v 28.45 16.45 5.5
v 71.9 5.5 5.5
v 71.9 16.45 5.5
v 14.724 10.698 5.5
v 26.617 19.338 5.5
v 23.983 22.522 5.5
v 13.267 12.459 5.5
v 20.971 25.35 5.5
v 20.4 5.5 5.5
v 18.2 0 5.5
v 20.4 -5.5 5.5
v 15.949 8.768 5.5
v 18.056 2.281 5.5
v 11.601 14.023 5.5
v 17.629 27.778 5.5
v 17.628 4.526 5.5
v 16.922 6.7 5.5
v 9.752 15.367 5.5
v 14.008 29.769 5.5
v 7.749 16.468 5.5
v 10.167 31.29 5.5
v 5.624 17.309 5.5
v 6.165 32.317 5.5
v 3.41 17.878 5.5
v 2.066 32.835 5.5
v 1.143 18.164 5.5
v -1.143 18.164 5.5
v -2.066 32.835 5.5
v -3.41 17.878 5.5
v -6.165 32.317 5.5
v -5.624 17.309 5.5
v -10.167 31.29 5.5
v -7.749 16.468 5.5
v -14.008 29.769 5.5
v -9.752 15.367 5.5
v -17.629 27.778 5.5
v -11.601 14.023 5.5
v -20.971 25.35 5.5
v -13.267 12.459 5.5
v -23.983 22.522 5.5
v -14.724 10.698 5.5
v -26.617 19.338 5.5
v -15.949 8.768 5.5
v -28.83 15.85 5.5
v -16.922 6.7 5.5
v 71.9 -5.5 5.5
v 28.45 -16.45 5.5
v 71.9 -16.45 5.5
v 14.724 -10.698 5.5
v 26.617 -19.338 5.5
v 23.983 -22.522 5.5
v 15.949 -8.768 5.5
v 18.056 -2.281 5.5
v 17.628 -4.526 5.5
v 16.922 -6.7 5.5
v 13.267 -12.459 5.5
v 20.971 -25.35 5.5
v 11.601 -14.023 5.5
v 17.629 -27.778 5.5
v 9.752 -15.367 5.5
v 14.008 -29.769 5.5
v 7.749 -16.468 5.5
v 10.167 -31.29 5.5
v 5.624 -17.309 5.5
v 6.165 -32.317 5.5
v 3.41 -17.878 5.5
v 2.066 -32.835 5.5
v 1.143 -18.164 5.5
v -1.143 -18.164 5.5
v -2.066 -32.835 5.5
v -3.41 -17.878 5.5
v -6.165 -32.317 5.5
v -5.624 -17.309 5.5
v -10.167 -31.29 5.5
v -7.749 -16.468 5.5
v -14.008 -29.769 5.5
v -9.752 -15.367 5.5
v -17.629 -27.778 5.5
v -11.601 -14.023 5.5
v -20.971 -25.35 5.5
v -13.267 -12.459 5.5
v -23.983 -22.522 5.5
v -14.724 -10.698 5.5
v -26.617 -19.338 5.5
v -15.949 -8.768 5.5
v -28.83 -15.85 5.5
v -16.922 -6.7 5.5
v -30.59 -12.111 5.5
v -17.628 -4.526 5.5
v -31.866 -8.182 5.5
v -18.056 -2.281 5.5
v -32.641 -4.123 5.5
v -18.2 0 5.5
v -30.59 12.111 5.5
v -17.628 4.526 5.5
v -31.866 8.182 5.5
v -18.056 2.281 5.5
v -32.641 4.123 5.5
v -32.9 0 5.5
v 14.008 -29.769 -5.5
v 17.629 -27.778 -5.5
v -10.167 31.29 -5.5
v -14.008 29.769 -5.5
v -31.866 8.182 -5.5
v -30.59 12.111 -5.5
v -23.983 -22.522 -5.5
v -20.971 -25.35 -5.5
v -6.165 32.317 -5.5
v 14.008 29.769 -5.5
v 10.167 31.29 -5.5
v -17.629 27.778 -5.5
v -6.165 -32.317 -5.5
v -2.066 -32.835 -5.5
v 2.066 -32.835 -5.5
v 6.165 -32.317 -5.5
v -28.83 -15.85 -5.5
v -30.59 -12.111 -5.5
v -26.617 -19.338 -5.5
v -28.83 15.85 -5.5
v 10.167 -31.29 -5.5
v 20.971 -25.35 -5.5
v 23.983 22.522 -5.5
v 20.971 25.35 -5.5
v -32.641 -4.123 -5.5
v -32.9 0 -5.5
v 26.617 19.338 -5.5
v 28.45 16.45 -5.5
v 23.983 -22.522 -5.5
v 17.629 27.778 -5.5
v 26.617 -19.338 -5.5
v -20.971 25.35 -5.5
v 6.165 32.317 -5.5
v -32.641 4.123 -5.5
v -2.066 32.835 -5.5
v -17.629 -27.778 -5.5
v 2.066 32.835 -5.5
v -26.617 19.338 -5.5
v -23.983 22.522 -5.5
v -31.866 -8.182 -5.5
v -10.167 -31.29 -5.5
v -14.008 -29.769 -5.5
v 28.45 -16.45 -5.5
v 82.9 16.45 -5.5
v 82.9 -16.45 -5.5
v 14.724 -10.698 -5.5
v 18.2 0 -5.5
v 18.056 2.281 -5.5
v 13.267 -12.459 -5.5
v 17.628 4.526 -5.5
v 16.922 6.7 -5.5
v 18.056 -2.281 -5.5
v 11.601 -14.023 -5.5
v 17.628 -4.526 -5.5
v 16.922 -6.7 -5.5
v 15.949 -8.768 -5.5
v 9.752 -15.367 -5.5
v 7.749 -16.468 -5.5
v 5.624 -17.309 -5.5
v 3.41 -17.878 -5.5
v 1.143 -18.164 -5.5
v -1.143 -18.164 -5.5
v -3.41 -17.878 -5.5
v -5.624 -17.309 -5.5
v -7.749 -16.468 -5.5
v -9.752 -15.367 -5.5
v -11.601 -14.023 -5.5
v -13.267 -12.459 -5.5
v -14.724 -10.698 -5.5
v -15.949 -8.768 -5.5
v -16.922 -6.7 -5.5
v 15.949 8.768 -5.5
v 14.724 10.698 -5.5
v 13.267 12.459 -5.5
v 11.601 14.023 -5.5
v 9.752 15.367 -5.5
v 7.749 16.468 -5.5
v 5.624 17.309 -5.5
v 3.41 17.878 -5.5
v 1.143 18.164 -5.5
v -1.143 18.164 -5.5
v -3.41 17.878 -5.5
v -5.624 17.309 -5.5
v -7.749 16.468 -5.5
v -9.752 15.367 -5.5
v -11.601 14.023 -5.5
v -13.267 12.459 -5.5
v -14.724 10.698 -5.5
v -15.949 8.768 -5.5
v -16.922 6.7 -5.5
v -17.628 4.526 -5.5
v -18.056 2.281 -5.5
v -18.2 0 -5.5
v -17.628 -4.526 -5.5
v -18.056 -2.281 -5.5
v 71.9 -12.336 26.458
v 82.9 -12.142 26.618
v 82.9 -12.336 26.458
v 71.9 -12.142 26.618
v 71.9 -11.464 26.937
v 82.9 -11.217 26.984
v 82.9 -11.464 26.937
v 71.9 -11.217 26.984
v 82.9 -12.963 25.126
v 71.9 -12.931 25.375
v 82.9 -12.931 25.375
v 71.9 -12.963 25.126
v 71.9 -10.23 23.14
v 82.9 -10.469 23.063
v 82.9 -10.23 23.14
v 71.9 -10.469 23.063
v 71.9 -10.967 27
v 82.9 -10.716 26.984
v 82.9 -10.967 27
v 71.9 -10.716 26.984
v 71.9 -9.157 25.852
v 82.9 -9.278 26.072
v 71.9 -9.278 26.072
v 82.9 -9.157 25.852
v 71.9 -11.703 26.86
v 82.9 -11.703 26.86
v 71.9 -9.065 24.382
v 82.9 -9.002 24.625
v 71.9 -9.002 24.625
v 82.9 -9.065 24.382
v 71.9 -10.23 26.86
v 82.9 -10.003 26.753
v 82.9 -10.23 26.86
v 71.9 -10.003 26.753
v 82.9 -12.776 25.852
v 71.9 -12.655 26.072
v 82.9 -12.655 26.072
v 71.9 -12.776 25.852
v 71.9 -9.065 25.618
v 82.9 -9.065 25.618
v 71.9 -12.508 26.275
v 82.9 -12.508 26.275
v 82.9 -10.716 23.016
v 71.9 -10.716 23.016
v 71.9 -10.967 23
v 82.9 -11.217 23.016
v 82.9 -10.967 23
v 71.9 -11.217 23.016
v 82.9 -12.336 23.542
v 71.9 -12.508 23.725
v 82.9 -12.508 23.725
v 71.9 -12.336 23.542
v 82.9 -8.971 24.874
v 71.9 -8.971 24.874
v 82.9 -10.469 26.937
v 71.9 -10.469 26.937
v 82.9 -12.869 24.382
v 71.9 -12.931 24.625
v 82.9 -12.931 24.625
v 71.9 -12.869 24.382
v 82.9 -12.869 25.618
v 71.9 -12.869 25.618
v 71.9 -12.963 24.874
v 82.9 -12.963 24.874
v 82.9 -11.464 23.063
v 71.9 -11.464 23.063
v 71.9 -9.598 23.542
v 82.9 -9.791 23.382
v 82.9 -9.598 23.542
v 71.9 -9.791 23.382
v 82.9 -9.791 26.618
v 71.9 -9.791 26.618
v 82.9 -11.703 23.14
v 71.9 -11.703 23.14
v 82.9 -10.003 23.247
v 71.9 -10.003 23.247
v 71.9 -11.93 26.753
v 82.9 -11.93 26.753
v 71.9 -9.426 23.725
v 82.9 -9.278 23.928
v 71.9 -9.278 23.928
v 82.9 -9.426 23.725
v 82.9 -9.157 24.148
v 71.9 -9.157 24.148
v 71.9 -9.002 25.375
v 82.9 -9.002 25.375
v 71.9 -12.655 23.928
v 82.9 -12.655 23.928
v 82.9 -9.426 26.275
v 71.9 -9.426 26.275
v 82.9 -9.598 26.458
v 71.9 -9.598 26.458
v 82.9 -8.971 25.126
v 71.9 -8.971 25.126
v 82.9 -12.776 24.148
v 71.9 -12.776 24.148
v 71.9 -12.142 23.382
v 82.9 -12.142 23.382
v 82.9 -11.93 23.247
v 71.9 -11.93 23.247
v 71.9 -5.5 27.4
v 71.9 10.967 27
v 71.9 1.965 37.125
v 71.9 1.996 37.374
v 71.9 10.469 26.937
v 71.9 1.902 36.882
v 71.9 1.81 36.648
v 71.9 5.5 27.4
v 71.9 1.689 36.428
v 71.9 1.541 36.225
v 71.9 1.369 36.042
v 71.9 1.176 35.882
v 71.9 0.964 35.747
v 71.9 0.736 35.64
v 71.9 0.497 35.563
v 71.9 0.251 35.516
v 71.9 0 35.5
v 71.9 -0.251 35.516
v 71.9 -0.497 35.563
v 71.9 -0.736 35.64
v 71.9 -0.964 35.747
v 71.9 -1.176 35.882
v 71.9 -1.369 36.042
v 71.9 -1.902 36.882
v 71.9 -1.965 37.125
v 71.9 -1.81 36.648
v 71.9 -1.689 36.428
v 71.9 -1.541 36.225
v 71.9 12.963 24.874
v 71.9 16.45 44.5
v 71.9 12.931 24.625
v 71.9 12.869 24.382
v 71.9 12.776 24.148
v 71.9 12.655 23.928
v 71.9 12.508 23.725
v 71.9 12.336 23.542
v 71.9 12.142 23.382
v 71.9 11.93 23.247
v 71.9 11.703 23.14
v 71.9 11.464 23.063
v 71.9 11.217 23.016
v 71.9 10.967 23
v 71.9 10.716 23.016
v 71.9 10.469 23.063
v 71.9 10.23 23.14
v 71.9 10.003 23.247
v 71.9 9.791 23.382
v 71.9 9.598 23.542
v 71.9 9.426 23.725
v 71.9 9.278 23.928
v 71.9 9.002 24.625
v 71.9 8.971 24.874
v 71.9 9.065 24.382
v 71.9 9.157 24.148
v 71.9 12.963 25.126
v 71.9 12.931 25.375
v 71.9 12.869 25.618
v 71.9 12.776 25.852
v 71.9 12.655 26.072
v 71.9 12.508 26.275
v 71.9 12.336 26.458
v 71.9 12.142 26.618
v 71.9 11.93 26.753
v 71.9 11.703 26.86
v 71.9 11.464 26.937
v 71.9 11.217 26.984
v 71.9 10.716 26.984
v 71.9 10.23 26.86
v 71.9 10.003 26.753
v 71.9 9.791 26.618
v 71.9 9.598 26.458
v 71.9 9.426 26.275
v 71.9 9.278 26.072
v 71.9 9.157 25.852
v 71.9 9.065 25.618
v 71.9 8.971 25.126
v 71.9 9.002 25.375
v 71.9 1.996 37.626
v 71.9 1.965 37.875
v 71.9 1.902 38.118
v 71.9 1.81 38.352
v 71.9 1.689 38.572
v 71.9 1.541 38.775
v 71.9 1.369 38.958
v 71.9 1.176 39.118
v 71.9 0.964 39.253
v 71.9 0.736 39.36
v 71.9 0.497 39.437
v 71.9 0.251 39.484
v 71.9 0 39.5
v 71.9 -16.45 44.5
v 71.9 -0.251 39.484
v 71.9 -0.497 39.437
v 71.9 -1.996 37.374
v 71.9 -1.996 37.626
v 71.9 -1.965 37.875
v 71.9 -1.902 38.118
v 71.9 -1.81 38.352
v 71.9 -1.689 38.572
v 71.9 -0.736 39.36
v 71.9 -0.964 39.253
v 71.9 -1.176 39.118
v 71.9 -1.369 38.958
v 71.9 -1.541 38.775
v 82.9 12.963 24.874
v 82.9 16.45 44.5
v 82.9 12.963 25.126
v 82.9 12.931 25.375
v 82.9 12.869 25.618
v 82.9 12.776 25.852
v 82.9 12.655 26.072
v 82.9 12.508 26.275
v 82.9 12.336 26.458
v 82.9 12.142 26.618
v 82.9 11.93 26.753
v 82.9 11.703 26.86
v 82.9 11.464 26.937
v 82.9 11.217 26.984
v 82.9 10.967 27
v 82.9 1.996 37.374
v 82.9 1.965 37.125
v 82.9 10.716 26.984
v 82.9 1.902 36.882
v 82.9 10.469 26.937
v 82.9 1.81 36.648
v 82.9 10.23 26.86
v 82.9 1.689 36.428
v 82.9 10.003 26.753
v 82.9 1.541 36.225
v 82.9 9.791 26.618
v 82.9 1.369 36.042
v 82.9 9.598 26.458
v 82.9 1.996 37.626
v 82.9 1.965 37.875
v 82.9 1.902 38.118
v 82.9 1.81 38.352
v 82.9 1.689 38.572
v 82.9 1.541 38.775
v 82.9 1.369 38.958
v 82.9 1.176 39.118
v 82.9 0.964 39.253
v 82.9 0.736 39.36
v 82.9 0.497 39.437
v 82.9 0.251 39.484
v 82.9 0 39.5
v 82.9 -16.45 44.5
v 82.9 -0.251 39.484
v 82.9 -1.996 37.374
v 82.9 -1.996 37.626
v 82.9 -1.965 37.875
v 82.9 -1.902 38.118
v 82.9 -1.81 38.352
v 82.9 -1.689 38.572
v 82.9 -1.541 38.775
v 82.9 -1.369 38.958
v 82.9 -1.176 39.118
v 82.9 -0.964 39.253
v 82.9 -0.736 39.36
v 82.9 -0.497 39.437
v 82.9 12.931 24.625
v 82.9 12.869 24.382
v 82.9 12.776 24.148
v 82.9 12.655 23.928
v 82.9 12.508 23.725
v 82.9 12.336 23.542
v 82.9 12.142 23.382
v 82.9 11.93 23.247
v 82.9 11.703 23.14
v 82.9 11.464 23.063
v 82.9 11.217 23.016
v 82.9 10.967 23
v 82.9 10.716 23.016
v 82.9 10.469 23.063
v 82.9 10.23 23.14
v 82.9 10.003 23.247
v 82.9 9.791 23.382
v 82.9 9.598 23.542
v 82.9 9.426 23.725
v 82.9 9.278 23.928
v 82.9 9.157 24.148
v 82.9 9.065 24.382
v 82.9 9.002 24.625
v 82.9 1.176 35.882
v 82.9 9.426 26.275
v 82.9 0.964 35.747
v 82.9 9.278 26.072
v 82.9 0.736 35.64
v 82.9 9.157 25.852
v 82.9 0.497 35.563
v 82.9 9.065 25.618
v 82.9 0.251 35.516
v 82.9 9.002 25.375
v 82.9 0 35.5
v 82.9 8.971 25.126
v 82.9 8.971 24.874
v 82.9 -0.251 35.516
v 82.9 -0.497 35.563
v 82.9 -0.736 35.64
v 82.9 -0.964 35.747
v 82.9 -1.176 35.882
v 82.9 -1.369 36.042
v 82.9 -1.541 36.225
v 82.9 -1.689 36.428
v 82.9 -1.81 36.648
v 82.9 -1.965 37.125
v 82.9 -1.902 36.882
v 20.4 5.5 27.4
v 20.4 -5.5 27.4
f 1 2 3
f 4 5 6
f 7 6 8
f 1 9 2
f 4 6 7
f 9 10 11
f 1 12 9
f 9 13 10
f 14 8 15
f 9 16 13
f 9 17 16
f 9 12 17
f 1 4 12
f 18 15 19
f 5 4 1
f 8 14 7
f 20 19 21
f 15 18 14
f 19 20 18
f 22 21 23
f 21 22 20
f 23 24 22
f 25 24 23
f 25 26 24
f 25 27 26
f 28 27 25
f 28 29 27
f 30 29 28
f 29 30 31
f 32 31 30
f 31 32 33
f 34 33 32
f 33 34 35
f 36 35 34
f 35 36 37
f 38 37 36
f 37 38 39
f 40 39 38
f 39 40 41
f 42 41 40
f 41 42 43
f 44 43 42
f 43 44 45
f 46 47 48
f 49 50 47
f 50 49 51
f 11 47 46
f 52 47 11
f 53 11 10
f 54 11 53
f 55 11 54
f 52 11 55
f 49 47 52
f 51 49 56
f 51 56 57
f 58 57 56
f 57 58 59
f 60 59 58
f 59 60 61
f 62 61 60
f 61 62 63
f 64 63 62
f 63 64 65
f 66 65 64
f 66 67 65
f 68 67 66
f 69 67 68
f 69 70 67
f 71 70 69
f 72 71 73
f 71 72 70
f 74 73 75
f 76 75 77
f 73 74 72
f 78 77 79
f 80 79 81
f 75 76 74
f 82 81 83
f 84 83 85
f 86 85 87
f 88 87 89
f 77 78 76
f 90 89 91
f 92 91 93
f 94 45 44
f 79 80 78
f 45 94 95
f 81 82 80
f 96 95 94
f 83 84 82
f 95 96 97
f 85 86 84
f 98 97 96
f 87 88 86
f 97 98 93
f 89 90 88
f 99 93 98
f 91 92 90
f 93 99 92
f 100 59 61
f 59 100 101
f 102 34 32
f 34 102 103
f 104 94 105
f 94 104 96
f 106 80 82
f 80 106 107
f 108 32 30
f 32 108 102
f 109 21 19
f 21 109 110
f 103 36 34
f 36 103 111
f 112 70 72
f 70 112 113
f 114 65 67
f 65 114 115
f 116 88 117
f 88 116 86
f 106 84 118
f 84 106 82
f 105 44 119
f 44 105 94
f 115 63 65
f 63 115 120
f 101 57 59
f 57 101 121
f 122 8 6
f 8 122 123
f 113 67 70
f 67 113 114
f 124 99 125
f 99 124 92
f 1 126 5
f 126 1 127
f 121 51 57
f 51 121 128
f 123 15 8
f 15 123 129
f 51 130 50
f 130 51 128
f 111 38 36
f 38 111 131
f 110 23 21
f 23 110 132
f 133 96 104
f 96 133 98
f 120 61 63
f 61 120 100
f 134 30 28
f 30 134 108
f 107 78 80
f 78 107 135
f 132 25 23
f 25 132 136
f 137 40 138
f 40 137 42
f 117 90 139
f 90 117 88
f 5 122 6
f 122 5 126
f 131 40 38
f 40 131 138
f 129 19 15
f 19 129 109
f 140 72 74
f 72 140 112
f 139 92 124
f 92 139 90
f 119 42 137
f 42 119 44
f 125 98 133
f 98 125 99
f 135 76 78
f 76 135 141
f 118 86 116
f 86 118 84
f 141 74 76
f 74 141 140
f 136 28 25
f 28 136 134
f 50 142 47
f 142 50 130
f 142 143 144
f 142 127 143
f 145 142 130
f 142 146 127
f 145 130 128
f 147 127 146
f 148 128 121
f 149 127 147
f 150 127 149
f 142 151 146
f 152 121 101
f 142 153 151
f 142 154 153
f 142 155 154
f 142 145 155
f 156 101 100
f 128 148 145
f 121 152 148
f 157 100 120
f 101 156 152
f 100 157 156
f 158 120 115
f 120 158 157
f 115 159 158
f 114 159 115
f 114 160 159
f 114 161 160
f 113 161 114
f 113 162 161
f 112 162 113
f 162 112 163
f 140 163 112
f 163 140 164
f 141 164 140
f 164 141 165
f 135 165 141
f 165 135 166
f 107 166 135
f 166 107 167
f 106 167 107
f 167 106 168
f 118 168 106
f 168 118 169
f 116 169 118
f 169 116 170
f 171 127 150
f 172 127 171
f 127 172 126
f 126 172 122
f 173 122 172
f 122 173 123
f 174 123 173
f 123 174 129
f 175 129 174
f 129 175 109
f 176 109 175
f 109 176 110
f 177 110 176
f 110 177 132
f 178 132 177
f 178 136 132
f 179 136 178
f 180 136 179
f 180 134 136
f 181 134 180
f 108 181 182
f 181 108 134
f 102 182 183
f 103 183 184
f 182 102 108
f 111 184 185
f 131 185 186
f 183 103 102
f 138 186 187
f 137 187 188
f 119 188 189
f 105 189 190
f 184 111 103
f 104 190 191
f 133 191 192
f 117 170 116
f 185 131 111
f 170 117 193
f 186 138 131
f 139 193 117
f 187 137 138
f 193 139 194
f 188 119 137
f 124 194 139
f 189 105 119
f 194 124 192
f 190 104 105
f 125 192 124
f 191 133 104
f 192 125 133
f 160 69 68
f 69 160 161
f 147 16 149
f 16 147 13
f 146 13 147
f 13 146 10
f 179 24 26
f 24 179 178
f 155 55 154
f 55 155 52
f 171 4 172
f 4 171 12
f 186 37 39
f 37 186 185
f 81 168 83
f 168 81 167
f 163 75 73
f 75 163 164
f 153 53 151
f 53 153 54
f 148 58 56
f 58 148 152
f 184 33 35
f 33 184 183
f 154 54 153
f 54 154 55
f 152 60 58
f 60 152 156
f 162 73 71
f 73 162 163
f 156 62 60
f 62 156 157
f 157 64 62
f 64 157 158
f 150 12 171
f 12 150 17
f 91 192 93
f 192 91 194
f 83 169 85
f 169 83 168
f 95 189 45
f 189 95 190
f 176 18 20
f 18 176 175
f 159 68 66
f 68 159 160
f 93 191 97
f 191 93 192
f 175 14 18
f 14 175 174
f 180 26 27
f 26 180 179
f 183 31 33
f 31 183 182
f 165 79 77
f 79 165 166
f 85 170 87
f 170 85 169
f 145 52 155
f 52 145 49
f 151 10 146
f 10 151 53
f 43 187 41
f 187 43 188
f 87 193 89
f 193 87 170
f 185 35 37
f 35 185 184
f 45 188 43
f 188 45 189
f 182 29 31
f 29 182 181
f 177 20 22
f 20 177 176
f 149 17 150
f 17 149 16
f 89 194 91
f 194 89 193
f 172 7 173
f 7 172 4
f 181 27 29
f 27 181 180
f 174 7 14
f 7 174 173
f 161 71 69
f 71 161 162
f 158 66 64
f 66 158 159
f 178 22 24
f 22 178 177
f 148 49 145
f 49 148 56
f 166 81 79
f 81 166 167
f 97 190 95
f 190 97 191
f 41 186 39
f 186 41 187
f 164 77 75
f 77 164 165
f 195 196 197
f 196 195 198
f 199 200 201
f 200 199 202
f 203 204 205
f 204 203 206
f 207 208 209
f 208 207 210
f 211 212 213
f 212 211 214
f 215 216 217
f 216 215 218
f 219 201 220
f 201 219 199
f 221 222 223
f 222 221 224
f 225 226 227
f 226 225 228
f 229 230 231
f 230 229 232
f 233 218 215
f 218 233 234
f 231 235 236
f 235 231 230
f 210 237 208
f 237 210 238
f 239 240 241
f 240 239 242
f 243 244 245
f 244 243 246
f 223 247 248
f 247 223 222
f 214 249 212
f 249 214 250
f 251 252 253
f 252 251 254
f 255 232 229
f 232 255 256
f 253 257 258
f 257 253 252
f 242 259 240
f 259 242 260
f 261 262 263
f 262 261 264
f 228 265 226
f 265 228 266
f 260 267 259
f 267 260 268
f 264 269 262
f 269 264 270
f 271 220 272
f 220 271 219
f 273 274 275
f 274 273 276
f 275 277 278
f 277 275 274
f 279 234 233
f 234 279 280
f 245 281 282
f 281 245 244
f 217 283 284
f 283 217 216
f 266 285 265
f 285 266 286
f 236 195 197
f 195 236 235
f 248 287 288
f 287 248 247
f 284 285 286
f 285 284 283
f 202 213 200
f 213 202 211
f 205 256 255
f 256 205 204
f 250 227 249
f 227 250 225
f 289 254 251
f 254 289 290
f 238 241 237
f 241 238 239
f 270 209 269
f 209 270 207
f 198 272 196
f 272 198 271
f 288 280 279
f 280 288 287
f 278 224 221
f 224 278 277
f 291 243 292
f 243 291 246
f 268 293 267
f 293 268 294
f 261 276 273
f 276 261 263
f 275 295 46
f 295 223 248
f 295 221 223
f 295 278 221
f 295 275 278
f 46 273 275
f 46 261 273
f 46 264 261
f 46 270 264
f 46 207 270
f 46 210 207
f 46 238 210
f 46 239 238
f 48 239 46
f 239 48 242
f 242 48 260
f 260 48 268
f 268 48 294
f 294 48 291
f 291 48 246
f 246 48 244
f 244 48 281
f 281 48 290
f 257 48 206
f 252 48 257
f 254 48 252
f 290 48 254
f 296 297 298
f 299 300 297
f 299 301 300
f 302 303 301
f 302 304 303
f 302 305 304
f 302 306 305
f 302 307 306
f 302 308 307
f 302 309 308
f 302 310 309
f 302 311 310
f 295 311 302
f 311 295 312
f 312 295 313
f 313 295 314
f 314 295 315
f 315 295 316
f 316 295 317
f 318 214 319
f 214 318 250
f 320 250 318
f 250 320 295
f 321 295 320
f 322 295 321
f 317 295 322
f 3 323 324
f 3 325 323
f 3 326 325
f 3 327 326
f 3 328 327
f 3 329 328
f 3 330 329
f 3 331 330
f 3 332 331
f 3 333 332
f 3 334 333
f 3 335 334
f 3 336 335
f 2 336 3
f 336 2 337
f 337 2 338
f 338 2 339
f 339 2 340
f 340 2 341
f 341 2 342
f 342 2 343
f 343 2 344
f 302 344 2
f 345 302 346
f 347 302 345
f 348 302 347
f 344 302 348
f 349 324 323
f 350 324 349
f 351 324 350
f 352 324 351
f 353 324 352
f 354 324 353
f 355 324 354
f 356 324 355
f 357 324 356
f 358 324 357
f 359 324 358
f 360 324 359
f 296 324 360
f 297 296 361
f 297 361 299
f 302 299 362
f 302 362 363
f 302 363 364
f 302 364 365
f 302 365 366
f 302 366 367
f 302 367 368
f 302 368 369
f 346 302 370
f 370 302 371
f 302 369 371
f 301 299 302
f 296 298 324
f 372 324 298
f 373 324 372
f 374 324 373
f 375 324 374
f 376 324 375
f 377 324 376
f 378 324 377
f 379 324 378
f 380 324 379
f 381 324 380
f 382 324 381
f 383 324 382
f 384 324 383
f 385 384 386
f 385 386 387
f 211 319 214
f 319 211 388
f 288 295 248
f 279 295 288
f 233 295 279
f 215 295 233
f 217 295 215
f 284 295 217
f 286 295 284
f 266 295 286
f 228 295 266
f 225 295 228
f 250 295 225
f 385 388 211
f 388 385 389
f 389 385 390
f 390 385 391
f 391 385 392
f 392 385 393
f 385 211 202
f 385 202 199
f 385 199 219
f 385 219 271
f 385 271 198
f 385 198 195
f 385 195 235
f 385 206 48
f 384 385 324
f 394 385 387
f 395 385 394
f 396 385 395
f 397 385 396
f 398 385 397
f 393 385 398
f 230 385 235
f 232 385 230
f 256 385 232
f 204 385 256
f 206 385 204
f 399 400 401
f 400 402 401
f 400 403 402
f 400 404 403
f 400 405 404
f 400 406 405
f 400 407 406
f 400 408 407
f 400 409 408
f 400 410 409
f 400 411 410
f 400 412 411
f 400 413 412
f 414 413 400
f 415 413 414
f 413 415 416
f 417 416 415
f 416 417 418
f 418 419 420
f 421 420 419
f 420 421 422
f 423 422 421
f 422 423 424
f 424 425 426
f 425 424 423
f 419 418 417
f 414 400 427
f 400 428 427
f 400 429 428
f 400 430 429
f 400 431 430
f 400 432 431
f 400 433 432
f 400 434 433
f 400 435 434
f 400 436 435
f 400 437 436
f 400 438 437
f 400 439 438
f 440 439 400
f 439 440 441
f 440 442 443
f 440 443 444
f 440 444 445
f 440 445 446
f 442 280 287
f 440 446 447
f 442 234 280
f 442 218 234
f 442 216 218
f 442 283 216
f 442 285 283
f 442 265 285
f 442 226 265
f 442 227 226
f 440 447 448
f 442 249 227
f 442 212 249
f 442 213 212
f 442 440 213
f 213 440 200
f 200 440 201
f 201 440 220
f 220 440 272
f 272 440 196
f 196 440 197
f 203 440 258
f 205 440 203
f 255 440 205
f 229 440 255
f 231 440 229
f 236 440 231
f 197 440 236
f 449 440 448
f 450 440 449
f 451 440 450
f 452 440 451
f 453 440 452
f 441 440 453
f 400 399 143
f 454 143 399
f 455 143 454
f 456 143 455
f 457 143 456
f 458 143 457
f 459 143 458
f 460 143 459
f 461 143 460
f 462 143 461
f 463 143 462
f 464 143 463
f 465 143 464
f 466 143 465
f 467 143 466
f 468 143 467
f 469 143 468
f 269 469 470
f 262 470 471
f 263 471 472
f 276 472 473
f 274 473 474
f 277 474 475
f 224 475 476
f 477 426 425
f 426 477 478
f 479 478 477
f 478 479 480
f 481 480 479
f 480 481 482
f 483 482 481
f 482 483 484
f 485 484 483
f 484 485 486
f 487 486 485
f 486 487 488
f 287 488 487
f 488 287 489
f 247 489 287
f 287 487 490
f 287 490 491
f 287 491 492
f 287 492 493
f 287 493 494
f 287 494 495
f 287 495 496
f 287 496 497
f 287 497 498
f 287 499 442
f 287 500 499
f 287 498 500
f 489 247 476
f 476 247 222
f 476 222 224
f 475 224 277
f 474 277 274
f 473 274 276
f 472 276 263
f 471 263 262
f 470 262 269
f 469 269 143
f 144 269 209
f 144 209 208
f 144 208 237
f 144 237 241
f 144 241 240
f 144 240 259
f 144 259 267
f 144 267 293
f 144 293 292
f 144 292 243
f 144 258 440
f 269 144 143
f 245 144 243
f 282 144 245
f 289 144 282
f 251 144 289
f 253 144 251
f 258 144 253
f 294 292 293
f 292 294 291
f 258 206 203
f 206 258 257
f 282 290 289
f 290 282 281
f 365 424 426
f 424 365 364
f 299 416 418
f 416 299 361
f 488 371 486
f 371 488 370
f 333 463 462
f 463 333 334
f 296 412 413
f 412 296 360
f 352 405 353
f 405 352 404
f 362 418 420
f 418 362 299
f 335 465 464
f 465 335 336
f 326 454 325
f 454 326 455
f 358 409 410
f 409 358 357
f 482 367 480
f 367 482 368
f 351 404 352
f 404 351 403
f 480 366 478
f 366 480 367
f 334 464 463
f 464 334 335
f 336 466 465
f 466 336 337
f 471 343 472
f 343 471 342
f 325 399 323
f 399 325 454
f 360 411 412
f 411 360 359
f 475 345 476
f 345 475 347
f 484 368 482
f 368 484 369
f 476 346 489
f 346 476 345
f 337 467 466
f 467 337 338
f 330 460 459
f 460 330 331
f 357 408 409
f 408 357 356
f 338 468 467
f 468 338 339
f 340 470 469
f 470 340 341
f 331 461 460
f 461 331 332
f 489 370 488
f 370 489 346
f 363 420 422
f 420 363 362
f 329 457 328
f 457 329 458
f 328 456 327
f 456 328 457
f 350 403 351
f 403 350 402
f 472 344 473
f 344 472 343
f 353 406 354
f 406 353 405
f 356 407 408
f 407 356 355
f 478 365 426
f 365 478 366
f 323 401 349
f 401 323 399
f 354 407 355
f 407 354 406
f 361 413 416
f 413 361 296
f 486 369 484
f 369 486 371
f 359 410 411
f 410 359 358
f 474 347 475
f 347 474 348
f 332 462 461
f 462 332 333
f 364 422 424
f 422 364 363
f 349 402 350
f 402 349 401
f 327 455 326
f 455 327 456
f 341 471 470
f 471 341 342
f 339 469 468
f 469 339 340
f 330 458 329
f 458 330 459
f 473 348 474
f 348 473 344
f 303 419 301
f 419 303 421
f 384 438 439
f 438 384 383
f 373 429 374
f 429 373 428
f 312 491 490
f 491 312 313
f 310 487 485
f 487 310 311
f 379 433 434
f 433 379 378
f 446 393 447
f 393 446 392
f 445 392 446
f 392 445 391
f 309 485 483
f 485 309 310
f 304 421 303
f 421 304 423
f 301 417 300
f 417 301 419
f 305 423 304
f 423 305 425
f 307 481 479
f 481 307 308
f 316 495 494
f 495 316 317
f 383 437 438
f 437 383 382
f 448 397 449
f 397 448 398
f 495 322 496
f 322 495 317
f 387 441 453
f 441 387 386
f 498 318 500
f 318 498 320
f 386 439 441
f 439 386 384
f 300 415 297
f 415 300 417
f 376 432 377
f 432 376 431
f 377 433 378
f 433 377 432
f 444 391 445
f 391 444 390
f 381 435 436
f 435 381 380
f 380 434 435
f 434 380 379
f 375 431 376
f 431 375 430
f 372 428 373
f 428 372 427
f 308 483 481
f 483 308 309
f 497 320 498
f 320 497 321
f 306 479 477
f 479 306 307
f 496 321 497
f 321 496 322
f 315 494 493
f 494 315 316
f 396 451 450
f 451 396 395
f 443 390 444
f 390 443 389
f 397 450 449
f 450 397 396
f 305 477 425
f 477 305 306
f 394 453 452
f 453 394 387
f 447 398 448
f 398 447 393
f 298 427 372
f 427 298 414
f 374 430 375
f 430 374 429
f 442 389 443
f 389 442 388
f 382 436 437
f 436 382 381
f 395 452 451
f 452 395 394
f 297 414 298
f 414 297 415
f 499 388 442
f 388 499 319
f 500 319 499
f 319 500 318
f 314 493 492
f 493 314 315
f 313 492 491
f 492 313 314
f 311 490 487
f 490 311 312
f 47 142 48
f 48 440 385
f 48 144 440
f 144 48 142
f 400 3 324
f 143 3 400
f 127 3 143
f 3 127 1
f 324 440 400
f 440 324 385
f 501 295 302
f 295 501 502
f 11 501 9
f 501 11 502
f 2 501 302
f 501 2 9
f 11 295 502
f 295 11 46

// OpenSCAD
$fn=50;
root_diameter = 35.5;

nub_thickness = .9;
nub_width = 3.4;
nub_height = 11;

crest_diameter = root_diameter + nub_thickness;
crest_radius = crest_diameter/2;

wall_thickness = 14.7;

arm_length = 50;
screw_diameter = 4;

can_radius = crest_radius + wall_thickness;
difference()
{
    cylinder(h=nub_height, r=can_radius, center = true);
    union()
    {
        #cylinder(h=nub_height, r=crest_radius, center = true);
    }
}

// horizontal arm
translate([can_radius -5, -can_radius/2, -nub_height/2])
#cube([arm_length, can_radius, nub_height], center = false);

difference()
{
    // vertical arm
    translate([can_radius + arm_length, -can_radius/2, -nub_height/2])
    rotate([0, -90, 0])
    #cube([arm_length, can_radius, nub_height], center = false);

    union() {
        // vertical hole
        translate([can_radius + arm_length, -can_radius/3, arm_length/2])
        rotate([0, -90, 0])
        #cylinder(h=nub_height, d=screw_diameter);

        // vertical hole
        translate([can_radius + arm_length, +can_radius * 1/3, arm_length/2])
        rotate([0, -90, 0])
        #cylinder(h=nub_height, d=screw_diameter);
        
            // vertical hole
        translate([can_radius + arm_length, 0 , arm_length * 3 /4])
        rotate([0, -90, 0])
        #cylinder(h=nub_height, d=screw_diameter);
    }
}

// fillet start of horizontal arm, end at vertical arm
translate([can_radius -5 - 7.5, -nub_height/2 , -nub_height/2])
#cube([arm_length + 7.5, nub_height, can_radius ], center = false);
